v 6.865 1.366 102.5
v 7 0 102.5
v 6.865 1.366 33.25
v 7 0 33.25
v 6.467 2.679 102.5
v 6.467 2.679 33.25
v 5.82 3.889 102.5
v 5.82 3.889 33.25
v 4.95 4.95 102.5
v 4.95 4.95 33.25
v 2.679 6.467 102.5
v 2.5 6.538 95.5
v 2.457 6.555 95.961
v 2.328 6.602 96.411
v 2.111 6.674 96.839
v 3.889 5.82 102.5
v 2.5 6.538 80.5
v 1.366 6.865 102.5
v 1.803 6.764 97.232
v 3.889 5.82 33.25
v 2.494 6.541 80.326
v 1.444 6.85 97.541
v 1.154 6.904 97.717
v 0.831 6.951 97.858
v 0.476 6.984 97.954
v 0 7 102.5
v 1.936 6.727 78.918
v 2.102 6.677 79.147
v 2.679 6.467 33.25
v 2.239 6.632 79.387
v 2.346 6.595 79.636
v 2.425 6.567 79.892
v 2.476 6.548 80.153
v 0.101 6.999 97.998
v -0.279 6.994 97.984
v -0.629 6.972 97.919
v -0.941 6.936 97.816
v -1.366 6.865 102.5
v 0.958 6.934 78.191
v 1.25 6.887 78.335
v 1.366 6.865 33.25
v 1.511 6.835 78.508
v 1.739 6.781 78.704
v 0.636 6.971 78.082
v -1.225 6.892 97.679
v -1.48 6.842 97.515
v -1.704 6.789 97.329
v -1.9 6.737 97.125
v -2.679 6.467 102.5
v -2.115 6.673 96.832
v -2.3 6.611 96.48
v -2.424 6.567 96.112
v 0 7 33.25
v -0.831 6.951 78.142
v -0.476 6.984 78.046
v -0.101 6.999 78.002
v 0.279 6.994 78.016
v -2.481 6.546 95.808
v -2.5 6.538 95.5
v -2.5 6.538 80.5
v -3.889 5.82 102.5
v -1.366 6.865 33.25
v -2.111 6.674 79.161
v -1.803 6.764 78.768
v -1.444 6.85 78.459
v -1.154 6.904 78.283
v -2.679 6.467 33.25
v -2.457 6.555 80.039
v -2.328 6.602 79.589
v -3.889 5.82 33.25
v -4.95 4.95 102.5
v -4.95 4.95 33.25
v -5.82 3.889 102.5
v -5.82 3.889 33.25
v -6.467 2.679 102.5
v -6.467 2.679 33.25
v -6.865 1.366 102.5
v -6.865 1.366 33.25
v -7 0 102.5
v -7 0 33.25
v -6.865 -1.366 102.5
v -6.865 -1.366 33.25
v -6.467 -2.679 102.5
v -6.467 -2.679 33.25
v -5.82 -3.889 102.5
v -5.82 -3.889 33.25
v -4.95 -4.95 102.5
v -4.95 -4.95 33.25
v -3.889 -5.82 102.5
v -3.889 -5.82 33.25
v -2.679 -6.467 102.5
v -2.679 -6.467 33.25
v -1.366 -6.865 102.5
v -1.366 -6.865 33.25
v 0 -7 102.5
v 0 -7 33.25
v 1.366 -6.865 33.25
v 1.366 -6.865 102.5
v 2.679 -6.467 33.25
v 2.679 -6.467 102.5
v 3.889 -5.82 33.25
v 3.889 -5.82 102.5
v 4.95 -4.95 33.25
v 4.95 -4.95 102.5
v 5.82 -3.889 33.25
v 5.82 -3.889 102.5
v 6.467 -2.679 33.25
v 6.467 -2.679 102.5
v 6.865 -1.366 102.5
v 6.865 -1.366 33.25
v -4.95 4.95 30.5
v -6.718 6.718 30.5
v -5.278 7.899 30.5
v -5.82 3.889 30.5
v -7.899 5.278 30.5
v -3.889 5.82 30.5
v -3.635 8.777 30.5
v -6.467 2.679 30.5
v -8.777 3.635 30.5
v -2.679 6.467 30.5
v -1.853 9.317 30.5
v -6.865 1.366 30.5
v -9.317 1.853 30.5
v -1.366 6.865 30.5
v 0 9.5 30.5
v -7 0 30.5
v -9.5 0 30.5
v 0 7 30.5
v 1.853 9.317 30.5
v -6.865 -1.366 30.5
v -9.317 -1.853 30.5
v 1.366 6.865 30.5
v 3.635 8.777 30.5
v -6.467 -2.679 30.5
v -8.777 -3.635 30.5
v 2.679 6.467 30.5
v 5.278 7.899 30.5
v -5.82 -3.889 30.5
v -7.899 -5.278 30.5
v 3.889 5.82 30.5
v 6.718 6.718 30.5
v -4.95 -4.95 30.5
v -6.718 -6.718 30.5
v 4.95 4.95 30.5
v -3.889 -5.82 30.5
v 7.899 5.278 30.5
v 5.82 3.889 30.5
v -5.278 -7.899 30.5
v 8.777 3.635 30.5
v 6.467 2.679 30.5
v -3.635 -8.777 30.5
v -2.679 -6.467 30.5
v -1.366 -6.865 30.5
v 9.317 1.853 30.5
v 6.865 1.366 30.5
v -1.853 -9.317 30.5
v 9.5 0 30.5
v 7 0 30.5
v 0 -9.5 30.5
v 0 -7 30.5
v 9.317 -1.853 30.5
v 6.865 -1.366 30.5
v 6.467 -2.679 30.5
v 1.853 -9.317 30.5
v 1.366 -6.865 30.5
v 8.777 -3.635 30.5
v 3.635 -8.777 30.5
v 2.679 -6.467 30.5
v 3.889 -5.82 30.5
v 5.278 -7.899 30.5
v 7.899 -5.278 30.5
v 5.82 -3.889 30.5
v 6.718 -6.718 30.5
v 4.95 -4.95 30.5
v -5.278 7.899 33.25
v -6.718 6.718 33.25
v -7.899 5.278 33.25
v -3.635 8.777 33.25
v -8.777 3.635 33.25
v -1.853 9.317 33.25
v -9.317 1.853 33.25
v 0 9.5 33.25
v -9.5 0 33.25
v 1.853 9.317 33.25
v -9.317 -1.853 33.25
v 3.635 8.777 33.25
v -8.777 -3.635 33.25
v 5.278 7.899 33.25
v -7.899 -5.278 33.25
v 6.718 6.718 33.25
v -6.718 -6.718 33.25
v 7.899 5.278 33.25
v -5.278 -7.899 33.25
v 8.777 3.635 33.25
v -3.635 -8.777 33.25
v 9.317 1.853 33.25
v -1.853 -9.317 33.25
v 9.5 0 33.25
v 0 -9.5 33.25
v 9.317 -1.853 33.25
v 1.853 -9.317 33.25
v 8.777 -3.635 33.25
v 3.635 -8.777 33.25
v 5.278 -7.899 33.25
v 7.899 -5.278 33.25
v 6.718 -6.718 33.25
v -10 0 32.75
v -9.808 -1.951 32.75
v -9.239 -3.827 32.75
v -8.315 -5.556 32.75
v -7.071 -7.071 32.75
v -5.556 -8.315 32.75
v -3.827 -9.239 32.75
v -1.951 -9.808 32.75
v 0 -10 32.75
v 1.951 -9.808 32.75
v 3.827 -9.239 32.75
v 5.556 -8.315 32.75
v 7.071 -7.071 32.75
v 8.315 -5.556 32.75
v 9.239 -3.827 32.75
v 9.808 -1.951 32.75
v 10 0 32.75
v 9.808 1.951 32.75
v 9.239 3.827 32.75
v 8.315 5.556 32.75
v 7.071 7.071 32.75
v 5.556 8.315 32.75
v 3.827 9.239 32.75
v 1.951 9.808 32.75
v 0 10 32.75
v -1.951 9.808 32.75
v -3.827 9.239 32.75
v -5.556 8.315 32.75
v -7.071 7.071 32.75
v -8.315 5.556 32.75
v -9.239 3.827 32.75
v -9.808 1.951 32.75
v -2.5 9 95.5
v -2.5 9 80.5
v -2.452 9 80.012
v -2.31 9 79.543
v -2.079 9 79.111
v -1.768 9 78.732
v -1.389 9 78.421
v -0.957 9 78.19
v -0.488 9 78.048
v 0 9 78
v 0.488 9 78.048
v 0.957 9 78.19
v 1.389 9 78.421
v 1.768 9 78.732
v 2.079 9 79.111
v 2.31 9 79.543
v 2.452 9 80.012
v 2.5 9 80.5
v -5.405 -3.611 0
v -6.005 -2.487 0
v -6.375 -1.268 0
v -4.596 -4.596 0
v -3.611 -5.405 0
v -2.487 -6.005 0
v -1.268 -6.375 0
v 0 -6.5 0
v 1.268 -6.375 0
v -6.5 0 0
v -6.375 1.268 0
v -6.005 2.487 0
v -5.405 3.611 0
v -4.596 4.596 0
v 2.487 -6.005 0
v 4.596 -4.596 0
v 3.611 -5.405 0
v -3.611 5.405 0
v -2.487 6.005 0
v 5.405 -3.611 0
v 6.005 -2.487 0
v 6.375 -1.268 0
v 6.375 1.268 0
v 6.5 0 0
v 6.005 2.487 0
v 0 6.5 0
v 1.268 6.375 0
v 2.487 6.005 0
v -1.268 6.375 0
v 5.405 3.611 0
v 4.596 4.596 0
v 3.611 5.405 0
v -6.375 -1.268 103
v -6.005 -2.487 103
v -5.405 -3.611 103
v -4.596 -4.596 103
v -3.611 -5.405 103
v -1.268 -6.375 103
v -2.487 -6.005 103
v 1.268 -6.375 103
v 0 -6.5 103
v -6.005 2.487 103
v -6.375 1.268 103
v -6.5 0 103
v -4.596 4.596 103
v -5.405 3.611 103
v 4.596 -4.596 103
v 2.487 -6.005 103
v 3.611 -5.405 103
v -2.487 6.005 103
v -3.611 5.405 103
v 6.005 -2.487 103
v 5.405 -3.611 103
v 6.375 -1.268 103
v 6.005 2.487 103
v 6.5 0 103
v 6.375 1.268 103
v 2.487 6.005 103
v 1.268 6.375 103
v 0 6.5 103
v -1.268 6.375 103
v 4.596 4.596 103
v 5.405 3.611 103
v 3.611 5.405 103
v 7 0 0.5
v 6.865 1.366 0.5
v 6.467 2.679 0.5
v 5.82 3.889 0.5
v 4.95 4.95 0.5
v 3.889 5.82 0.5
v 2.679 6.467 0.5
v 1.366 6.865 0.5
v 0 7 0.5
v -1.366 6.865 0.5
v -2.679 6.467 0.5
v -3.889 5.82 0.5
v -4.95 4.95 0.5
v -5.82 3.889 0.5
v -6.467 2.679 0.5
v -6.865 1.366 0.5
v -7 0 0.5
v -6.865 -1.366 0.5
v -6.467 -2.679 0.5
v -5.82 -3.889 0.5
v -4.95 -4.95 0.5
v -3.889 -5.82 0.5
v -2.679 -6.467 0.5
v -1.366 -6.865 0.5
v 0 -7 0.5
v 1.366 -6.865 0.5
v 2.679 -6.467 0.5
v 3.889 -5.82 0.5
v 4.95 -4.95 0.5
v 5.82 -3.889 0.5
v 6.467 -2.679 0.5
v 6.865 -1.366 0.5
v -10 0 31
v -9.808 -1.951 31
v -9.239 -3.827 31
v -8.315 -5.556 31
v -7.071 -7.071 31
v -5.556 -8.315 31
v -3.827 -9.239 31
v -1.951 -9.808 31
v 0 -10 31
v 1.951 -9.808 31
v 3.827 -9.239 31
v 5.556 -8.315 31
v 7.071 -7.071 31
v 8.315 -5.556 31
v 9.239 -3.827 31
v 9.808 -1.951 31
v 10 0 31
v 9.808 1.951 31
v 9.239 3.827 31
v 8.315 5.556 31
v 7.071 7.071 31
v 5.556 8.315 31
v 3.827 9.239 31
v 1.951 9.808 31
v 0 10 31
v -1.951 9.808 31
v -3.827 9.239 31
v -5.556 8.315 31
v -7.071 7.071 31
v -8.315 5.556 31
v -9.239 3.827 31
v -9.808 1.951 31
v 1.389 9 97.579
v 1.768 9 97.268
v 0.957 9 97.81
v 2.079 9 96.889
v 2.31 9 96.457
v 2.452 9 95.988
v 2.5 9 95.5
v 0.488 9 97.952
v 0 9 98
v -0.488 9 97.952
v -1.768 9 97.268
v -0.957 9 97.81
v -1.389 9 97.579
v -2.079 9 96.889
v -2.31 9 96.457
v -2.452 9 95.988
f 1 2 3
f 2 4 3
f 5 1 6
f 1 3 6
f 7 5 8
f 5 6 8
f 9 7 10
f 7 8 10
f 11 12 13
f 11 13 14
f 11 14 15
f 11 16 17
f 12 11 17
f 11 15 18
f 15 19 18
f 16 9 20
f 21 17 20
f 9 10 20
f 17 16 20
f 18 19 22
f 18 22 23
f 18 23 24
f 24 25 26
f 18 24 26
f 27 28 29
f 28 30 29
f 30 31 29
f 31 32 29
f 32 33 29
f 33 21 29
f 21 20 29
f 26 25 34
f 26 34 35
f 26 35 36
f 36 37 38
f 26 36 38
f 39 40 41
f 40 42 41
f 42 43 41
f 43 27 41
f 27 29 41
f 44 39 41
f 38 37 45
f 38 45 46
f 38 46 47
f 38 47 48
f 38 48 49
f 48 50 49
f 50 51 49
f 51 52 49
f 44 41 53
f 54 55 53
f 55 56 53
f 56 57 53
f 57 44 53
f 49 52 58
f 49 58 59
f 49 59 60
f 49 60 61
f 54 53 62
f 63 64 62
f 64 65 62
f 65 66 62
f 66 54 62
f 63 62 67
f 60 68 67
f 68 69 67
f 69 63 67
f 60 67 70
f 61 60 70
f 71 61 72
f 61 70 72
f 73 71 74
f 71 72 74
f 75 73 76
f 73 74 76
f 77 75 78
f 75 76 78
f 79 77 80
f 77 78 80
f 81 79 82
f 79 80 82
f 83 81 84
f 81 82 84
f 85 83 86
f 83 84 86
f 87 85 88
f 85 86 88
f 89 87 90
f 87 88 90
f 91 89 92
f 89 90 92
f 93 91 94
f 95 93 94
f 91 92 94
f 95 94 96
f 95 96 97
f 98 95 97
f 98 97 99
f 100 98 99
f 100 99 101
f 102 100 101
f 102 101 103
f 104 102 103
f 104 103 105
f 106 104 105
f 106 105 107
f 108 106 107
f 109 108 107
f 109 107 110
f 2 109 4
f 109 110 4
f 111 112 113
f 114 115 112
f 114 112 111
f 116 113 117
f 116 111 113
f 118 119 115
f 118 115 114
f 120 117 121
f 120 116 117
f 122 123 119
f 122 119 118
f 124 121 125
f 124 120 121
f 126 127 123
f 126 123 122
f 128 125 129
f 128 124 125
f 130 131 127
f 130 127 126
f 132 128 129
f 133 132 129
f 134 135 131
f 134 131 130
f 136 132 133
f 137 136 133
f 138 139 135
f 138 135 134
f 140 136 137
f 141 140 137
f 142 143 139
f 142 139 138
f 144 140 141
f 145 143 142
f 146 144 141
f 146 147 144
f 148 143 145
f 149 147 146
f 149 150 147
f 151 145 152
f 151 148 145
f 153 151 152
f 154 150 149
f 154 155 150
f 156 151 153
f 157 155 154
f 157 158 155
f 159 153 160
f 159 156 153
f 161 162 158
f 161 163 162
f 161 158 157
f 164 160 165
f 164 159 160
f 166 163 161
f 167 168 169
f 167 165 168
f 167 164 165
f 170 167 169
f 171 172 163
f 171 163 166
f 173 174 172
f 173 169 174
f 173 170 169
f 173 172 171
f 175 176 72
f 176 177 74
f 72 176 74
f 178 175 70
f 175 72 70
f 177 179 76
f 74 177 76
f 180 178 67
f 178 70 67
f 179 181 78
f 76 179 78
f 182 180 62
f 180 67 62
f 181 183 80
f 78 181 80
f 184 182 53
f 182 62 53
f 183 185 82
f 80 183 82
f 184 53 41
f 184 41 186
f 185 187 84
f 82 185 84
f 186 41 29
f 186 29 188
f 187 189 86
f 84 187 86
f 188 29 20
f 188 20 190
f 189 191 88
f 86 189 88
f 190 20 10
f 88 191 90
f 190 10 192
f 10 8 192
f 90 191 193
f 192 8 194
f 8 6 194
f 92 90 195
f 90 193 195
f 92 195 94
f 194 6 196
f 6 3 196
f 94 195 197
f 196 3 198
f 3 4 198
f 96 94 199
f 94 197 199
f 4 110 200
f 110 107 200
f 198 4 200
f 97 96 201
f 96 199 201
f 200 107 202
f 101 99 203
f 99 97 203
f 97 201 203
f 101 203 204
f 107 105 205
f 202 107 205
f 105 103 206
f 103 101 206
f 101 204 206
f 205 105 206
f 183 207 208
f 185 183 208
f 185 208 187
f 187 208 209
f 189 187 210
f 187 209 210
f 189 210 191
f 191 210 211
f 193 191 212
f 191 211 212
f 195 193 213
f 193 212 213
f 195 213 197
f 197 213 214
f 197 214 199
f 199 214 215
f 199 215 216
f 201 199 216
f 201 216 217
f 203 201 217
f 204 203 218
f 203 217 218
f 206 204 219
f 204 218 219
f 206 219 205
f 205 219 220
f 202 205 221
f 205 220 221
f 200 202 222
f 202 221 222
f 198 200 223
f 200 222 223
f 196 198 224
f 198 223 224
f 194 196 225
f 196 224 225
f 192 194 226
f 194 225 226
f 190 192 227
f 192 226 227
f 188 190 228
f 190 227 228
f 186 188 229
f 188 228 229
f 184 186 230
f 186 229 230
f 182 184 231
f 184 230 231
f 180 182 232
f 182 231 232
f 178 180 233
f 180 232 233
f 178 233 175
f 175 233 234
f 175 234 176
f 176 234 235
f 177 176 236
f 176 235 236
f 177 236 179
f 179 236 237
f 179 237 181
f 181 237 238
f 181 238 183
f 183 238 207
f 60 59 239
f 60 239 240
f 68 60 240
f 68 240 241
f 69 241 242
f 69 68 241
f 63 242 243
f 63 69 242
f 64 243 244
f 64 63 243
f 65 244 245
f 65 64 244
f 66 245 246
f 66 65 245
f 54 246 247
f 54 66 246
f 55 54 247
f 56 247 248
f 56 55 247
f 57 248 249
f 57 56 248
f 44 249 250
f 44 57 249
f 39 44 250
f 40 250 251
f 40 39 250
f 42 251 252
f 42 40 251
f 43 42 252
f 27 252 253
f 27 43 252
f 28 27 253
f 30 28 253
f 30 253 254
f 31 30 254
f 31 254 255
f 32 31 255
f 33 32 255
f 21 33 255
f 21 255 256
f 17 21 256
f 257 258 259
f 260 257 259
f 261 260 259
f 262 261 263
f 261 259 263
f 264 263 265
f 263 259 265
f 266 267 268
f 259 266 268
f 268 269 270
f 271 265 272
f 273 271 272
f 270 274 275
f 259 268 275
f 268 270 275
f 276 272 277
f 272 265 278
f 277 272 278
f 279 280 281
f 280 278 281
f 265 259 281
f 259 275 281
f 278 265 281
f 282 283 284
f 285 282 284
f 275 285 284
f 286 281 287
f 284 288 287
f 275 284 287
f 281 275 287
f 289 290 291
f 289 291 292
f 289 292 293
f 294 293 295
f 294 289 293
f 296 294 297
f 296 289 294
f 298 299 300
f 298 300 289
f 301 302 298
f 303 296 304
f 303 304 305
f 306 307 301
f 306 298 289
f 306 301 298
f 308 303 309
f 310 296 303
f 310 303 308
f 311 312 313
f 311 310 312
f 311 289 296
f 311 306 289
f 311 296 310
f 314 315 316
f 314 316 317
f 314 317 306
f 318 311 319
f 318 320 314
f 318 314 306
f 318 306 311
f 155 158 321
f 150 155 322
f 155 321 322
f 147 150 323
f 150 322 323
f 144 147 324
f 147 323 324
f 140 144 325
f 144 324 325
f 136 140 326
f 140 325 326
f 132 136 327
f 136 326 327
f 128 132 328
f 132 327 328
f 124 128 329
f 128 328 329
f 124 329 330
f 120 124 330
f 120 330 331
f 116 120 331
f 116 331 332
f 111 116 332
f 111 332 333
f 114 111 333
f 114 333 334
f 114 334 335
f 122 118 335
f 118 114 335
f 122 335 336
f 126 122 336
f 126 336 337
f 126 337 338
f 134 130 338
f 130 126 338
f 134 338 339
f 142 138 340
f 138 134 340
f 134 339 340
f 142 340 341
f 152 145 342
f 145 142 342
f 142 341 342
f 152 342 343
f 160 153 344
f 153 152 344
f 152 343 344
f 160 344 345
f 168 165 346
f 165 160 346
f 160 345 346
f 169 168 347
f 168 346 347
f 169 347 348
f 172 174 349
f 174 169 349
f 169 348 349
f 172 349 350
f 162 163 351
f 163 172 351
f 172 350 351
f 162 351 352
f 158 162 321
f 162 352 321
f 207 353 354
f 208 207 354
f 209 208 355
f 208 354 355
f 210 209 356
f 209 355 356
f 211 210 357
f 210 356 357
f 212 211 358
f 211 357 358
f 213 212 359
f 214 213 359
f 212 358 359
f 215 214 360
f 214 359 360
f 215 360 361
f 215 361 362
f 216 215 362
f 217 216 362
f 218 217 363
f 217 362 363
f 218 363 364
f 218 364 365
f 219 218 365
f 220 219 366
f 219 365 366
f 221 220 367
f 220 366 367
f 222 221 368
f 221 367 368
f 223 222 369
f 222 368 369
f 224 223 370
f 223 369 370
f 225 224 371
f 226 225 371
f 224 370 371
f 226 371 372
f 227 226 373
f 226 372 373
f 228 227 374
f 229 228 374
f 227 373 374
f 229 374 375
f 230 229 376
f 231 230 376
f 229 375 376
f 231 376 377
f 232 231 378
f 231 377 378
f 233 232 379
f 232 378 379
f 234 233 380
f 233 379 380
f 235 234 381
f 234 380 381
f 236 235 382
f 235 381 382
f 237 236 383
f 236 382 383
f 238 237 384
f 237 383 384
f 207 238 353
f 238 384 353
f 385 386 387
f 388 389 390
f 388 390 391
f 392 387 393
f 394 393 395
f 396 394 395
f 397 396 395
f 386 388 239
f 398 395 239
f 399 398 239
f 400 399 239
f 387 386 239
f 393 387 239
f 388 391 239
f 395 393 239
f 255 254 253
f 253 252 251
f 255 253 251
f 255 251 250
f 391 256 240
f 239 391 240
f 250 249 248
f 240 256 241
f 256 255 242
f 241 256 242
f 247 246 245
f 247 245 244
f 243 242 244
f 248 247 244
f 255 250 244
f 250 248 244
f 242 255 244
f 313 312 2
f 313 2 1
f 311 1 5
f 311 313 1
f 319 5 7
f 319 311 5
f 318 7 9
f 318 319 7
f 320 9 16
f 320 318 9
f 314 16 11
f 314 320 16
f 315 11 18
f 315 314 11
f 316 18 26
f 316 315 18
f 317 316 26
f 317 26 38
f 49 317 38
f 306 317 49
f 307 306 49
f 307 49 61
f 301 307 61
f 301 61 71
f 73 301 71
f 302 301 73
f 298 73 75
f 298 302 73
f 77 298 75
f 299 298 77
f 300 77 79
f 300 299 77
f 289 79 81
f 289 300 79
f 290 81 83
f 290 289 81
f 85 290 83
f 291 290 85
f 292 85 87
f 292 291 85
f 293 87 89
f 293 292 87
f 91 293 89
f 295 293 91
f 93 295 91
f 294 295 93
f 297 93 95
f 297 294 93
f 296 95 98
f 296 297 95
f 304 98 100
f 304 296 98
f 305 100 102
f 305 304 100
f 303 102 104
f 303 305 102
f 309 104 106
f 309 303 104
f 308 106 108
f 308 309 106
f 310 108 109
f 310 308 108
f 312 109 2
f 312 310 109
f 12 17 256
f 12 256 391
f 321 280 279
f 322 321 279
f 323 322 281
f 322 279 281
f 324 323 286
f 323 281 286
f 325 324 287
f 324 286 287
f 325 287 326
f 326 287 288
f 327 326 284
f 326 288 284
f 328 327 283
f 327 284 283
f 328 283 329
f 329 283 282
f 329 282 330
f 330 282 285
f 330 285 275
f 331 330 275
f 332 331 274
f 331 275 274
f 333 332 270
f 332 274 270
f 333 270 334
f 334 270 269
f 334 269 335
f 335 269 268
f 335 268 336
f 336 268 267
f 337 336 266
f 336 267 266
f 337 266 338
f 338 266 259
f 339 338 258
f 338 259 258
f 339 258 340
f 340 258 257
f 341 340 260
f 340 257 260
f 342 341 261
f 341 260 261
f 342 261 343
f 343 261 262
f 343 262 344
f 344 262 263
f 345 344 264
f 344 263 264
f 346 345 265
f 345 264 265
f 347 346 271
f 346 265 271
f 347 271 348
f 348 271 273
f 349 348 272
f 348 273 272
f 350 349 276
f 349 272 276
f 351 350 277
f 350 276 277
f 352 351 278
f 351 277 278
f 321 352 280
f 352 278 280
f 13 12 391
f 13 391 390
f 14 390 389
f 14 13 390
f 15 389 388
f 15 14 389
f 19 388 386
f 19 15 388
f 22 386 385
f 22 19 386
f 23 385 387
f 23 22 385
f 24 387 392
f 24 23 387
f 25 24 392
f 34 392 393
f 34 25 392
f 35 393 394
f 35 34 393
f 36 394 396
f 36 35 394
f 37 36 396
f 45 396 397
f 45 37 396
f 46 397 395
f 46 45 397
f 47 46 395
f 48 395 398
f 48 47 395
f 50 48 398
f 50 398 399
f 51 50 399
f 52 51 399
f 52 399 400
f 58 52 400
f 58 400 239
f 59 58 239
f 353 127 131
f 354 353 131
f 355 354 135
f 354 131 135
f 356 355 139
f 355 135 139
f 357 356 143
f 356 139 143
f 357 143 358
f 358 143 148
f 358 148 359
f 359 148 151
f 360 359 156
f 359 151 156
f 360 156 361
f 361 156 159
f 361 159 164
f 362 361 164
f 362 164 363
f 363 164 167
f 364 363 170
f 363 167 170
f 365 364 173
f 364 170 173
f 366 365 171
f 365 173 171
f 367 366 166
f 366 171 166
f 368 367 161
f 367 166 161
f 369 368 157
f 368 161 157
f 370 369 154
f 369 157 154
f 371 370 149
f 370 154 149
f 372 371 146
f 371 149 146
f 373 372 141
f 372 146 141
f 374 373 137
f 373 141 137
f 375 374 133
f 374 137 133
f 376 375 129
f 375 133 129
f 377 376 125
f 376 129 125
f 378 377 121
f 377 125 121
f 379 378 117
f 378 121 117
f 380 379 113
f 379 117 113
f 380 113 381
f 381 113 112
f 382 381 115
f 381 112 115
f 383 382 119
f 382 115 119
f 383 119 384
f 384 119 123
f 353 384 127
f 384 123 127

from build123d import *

# Parameters (mm, degrees)
SKICA1_R                     = 7
P_IDAT_VYSUNUT_M1_DEPTH      = 103
SKICA2_W                     = 5
SKICA2_H                     = 2.75
ZKOSEN_1_SIZE                = 0.5
P_IDAT_VYSUNUT_M2_DEPTH      = 2
P_IDAT_VYSUNUT_M2_DEPTH_BACK = 2


with BuildPart() as part:
    # Skica1 → Přidat vysunutím1 (new body)
    with BuildSketch(Plane.XY):
        Circle(SKICA1_R)
    extrude(amount=P_IDAT_VYSUNUT_M1_DEPTH)

    # Skica2 → Rotovat1 (revolve)
    with BuildSketch(Plane(origin=(0, 0, 0), x_dir=(1, 0, 0), z_dir=(0, 1, 0))):
        with Locations((7.5, -31.875)):
            Rectangle(SKICA2_W, SKICA2_H)
    revolve(axis=Axis((0, 0, 0), (0, 0, 1)))

    # Zkosení1
    zkosen_1_edges = [part.edges().sort_by_distance(p)[0] for p in [
        (-7, 0, 103),
        (-7, 0, 0),
        (-10, 0, 30.5),
        (-10, 0, 33.25),
    ]]
    chamfer(zkosen_1_edges, length=ZKOSEN_1_SIZE)

    # Skica5 → Přidat vysunutím2 (add, two sides: drawn at the far end of the back side and taken through both)
    with BuildSketch(Plane(origin=(0, 7, 0), x_dir=(1, 0, 0), z_dir=(0, 1, 0)).offset(-P_IDAT_VYSUNUT_M2_DEPTH_BACK)):
        with BuildLine():
            Line((2.5, -80.5), (2.5, -95.5))
            ThreePointArc((2.5, -95.5), (0, -98), (-2.5, -95.5))
            Line((-2.5, -95.5), (-2.5, -80.5))
            ThreePointArc((-2.5, -80.5), (0, -78), (2.5, -80.5))
        make_face()
    extrude(amount=P_IDAT_VYSUNUT_M2_DEPTH + P_IDAT_VYSUNUT_M2_DEPTH_BACK)


solid = part.part
